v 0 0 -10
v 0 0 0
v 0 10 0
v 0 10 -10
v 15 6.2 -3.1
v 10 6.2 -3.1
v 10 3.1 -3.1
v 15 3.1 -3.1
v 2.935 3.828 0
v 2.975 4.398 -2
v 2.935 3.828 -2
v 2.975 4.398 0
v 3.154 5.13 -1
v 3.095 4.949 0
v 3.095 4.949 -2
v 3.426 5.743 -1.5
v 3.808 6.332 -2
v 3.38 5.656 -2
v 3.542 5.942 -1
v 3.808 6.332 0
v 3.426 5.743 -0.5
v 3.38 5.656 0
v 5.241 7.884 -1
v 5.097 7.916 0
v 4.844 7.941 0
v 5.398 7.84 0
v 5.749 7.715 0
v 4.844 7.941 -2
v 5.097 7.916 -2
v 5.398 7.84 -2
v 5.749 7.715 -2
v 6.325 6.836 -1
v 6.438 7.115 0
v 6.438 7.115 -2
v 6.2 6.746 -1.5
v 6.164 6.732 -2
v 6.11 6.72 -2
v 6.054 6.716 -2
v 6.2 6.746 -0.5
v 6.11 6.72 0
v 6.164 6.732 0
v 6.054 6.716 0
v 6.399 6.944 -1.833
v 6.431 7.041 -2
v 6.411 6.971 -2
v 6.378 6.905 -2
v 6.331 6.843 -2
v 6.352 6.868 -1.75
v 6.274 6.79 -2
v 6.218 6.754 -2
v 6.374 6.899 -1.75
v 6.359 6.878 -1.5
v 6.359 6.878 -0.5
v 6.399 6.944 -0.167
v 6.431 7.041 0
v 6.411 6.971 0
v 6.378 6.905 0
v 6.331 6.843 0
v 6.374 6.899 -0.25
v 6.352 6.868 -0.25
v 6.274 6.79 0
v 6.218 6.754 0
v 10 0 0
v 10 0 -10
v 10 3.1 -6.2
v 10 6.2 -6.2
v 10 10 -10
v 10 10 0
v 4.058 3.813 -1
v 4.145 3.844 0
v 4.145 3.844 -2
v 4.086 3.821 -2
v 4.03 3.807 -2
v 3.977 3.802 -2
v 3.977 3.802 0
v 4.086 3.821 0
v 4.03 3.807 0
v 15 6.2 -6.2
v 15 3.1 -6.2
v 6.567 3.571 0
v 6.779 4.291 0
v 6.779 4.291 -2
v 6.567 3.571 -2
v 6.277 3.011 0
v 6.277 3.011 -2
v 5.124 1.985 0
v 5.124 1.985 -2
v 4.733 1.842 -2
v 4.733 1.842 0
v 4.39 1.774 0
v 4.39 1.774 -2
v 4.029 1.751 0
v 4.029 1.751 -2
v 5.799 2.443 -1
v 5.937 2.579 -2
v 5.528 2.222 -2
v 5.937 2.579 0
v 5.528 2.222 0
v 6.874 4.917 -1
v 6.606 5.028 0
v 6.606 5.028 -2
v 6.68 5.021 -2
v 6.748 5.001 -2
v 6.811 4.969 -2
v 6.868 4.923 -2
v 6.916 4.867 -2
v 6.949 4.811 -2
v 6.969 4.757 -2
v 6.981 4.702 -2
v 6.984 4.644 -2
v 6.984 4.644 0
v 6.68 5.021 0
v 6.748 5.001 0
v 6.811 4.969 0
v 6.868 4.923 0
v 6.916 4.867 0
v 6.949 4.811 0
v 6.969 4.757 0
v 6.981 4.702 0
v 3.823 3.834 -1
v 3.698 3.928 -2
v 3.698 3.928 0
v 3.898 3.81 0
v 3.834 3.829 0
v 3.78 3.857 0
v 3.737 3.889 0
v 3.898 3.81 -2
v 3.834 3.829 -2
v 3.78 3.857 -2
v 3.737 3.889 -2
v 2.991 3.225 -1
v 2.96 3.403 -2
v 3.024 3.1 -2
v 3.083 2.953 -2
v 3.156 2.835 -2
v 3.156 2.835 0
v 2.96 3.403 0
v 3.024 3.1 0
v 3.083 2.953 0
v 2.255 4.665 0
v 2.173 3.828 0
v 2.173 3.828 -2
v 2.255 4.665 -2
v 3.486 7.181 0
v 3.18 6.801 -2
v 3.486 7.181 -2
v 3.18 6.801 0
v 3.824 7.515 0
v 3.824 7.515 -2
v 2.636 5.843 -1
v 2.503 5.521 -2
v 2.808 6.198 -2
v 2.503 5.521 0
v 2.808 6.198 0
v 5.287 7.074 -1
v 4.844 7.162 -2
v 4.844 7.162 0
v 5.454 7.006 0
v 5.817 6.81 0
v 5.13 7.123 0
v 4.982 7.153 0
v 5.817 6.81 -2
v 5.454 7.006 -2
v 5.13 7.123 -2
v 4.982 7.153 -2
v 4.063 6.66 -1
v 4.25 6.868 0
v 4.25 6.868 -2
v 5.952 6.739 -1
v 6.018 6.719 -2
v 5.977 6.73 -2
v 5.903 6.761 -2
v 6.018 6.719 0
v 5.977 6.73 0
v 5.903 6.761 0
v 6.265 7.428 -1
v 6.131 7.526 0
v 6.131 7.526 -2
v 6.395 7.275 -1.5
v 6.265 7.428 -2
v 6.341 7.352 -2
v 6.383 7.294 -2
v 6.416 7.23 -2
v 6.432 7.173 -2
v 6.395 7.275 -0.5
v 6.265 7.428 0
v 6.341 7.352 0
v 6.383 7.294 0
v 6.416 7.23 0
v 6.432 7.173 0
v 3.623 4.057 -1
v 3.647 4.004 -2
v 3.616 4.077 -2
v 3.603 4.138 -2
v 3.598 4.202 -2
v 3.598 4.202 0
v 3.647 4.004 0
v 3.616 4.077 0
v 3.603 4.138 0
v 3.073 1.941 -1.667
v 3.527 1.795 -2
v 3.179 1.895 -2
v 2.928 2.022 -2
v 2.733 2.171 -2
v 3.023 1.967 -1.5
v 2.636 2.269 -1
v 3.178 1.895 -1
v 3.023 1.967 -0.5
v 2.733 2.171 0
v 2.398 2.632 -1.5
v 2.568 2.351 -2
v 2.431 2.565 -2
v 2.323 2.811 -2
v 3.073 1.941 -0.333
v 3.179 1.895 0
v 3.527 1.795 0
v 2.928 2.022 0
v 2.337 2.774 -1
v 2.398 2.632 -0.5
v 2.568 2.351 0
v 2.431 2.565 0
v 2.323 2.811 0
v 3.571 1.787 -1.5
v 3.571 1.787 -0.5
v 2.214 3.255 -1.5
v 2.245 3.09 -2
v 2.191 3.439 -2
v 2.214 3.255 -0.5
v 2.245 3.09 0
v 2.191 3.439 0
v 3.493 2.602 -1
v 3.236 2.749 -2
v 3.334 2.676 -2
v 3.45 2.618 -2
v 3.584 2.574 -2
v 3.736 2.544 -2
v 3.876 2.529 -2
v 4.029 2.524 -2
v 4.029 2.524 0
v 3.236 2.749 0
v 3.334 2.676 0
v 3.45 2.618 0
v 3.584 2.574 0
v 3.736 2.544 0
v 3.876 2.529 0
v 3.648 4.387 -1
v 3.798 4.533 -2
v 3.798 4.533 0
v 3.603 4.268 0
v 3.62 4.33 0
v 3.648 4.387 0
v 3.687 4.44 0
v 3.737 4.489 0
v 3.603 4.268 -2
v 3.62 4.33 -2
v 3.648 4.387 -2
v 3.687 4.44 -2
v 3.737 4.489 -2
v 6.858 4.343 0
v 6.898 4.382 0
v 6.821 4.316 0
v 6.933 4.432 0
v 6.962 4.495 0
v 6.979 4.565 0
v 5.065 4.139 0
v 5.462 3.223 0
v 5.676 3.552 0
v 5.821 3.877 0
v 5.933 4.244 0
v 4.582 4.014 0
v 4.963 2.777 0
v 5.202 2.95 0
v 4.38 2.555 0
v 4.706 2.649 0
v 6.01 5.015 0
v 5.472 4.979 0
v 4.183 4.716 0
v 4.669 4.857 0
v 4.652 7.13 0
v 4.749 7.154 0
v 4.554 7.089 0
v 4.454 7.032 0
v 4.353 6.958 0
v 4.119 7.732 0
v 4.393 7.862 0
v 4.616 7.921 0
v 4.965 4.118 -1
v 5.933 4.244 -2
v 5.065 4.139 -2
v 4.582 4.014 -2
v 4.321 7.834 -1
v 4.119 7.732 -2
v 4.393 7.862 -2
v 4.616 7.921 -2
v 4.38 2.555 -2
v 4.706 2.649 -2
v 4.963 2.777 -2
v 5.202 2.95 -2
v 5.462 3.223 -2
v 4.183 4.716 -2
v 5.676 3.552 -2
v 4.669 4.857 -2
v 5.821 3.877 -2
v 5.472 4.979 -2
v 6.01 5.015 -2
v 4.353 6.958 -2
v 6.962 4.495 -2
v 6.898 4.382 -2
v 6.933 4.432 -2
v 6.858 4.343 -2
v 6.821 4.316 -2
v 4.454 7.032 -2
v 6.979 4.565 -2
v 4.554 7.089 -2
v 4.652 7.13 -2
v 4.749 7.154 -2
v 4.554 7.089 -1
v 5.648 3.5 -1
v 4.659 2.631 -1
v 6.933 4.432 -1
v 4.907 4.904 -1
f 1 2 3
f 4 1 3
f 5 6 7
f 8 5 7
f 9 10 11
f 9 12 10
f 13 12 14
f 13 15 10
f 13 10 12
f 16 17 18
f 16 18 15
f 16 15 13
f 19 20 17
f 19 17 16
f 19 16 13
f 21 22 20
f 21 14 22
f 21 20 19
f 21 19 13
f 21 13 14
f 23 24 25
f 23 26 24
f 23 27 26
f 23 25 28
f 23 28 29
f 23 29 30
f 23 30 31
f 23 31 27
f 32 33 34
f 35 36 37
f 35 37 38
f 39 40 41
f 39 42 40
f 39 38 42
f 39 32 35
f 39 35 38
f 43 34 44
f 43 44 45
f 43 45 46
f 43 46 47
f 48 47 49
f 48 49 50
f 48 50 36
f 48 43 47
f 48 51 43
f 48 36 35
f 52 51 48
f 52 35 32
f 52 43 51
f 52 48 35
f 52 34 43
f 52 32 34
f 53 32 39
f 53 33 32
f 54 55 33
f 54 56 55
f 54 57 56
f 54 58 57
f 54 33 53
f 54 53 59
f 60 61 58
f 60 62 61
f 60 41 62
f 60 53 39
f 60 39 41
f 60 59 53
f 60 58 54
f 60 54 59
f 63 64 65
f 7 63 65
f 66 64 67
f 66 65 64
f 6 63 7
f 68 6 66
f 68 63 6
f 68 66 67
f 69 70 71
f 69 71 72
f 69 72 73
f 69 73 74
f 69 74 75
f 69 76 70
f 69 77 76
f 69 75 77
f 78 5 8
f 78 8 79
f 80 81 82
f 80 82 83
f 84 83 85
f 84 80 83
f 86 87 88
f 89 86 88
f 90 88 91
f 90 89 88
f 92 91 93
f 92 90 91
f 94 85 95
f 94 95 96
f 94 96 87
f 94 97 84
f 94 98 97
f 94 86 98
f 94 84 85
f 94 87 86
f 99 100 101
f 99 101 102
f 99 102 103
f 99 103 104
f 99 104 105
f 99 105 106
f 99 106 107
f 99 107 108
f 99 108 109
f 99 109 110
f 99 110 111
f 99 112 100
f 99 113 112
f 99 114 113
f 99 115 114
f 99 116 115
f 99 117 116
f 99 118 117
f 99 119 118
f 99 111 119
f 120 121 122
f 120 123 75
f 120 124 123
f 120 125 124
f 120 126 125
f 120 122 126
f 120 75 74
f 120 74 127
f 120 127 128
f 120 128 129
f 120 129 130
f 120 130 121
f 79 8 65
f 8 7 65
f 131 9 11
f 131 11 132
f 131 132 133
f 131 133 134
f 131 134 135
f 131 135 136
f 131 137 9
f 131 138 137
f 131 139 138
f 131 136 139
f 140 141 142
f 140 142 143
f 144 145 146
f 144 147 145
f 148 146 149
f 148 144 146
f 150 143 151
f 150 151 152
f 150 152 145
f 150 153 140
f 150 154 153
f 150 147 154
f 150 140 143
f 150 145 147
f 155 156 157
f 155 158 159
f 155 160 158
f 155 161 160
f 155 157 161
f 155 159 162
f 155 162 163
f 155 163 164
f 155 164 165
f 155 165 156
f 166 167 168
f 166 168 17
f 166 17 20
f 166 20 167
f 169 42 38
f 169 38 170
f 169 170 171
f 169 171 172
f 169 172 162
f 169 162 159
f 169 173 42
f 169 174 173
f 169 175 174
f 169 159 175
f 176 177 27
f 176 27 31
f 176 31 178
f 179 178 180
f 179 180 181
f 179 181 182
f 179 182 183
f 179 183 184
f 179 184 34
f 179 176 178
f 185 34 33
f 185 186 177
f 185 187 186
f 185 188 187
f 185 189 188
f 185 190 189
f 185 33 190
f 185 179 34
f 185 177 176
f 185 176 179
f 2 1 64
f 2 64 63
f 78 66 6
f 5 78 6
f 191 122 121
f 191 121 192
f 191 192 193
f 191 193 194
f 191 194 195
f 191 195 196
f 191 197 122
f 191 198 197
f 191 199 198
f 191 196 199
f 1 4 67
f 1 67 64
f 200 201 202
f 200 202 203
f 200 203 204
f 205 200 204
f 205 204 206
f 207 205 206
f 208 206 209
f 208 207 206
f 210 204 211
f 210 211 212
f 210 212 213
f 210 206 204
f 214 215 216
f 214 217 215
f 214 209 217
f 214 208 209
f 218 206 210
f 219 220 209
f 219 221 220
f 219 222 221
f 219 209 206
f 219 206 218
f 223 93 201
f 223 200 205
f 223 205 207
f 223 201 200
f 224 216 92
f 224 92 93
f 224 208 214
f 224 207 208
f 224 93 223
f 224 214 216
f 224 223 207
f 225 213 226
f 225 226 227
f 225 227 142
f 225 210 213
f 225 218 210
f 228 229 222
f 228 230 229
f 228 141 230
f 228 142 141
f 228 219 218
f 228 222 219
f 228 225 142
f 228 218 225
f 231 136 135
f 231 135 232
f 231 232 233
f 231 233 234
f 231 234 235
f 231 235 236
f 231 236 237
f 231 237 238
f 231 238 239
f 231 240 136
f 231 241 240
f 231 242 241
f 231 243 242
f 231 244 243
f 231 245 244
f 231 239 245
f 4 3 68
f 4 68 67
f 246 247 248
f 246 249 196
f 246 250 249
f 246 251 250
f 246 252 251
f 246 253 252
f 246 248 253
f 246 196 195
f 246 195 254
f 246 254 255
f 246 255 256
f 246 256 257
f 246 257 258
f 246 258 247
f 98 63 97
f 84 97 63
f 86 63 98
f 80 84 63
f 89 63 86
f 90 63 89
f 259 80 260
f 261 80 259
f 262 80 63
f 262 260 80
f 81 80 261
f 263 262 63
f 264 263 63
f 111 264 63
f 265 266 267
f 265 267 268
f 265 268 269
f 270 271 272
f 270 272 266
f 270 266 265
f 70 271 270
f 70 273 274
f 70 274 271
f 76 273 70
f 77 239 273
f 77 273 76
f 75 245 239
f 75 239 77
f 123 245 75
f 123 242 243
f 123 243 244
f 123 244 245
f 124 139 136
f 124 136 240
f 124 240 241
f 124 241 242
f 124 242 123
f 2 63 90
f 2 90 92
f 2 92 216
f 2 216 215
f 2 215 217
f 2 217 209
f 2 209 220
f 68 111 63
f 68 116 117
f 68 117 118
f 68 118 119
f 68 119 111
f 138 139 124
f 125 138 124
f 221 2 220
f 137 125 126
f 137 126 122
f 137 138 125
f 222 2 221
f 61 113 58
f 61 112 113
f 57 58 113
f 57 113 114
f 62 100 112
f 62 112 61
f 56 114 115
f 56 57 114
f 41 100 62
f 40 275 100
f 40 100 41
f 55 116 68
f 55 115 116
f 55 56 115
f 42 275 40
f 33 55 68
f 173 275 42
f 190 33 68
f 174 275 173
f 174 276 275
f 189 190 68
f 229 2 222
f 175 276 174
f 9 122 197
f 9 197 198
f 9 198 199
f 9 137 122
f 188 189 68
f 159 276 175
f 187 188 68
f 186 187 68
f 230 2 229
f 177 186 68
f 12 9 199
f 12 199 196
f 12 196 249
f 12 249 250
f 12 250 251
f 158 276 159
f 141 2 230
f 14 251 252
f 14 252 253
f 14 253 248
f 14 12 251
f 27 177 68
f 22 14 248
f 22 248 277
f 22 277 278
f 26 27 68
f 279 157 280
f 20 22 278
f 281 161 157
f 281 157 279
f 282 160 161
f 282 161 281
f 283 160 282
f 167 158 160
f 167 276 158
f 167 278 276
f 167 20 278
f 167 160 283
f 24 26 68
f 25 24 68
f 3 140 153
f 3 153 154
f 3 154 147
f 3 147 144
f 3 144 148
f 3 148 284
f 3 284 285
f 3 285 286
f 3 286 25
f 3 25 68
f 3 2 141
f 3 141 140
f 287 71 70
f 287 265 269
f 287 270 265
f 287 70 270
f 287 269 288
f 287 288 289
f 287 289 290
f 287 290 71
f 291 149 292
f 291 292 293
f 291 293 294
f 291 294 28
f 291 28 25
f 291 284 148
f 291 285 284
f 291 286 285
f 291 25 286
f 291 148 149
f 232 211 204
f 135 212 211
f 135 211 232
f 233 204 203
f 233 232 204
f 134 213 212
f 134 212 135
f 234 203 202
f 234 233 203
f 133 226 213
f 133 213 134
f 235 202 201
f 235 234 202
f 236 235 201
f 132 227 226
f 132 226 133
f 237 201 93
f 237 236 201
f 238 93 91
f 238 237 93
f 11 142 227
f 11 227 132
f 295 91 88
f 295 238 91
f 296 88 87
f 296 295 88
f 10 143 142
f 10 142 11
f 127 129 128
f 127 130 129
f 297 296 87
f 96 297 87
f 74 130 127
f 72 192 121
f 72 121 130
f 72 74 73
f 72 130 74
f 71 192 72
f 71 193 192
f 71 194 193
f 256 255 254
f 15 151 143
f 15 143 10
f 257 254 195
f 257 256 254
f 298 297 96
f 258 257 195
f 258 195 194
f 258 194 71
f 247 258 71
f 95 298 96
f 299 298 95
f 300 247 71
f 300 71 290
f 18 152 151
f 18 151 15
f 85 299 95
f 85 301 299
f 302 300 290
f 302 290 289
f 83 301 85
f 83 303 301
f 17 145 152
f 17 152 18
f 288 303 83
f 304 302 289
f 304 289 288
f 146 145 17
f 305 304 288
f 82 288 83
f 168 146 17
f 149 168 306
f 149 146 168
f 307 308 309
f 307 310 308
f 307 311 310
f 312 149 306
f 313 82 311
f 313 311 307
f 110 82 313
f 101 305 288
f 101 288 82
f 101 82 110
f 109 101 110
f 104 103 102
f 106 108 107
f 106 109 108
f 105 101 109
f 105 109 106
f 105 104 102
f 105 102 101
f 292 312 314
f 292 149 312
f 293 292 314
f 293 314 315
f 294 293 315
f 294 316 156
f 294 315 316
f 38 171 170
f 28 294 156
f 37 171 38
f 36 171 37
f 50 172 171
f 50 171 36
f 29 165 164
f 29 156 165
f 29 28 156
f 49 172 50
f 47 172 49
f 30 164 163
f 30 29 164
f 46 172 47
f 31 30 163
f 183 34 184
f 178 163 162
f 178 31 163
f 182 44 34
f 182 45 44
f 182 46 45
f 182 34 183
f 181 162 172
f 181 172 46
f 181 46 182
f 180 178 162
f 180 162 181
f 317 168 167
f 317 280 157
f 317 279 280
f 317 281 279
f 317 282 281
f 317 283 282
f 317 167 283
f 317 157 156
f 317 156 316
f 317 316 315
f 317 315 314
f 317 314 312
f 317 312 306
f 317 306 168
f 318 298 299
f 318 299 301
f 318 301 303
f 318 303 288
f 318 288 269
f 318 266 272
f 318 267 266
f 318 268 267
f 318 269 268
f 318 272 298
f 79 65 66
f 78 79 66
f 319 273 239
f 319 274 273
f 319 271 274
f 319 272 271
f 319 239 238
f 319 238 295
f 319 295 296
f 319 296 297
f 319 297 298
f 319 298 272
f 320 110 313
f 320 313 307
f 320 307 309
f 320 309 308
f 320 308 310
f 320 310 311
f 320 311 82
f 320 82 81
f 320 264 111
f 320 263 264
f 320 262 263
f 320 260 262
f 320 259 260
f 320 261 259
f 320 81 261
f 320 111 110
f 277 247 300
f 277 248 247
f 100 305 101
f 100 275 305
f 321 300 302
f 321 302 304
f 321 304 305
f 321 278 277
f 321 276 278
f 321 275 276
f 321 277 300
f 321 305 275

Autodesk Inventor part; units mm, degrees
ref_plane "YZ Plane" through (0, 0, 0) normal (1, 0, 0) x (0, 1, 0)
ref_plane "XZ Plane" through (0, 0, 0) normal (0, 1, 0) x (-1, 0, 0)
ref_plane "XY Plane" through (0, 0, 0) normal (0, 0, 1) x (1, 0, 0)
sketch "Sketch1" plane through (0, 0, 0) normal (1, 0, 0) x (0, 1, 0)
  line L0 (0, 0) -> (10, 0)
  line L1 (10, 0) -> (10, -10)
  line L2 (10, -10) -> (0, -10)
  line L3 (0, -10) -> (0, 0)
  dimension "d0" = 10
  dimension "d1" = 10
extrude "Extrusion1" add sketch "Sketch1" along normal blind 10
sketch "Sketch4" plane through (0, 0, 0) normal (0, 0, 1) x (1, 0, 0)
  line L0 (1.8731, 7.9408) -> (4.4271, 7.9408) construction
  line L1 (4.4271, 7.9408) -> (4.4271, 4.8928) construction
  line L2 (4.4271, 4.8928) -> (1.8731, 4.8928) construction
  line L3 (1.8731, 4.8928) -> (1.8731, 7.9408) construction
  spline S0 degree 2 poles (6.7794, 4.2913) (6.548, 3.1344) (5.0493, 1.7514) (4.0292, 1.7514) knots 0 0 0 1 2 2 2
  spline S1 degree 2 poles (4.0292, 1.7514) (3.0984, 1.7514) (2.1729, 2.7873) (2.1729, 3.8285) knots 0 0 0 1 2 2 2
  spline S2 degree 2 poles (2.1729, 3.8285) (2.1729, 4.8066) (3.0984, 6.8785) (3.8241, 7.5148) knots 0 0 0 1 2 2 2
  spline S3 degree 2 poles (3.8241, 7.5148) (4.3079, 7.9408) (4.8442, 7.9408) knots 0 0 0 1 1 1
  spline S4 degree 2 poles (4.8442, 7.9408) (5.1861, 7.9408) (5.7487, 7.7146) knots 0 0 0 1 1 1
  spline S5 degree 2 poles (5.7487, 7.7146) (6.4376, 7.4412) (6.4376, 7.1152) knots 0 0 0 1 1 1
  spline S6 degree 2 poles (6.4376, 7.1152) (6.4376, 6.9574) (6.2115, 6.7155) (6.0537, 6.7155) knots 0 0 0 1 2 2 2
  spline S7 degree 2 poles (6.0537, 6.7155) (5.9696, 6.7155) (5.8171, 6.8102) knots 0 0 0 1 1 1
  spline S8 degree 2 poles (5.8171, 6.8102) (5.2439, 7.1625) (4.8442, 7.1625) knots 0 0 0 1 1 1
  spline S9 degree 2 poles (4.8442, 7.1625) (4.5603, 7.1625) (4.25, 6.868) knots 0 0 0 1 1 1
  spline S10 degree 2 poles (4.25, 6.868) (4.0975, 6.7208) (3.8083, 6.3316) knots 0 0 0 1 1 1
  spline S11 degree 2 poles (3.8083, 6.3316) (2.9354, 5.18) (2.9354, 3.8285) knots 0 0 0 1 1 1
  spline S12 degree 2 poles (2.9354, 3.8285) (2.9354, 3.1186) (3.1562, 2.8346) knots 0 0 0 1 1 1
  spline S13 degree 2 poles (3.1562, 2.8346) (3.3929, 2.5244) (4.0292, 2.5244) knots 0 0 0 1 1 1
  spline S14 degree 2 poles (4.0292, 2.5244) (4.7023, 2.5244) (5.2018, 2.9503) knots 0 0 0 1 1 1
  spline S15 degree 2 poles (5.2018, 2.9503) (5.7277, 3.4026) (5.9328, 4.2439) knots 0 0 0 1 1 1
  spline S16 degree 2 poles (5.9328, 4.2439) (4.8916, 4.1914) (4.1448, 3.8443) knots 0 0 0 1 1 1
  spline S17 degree 2 poles (4.1448, 3.8443) (4.0554, 3.8022) (3.9766, 3.8022) knots 0 0 0 1 1 1
  spline S18 degree 2 poles (3.9766, 3.8022) (3.8083, 3.8022) (3.6979, 3.9284) knots 0 0 0 1 1 1
  spline S19 degree 2 poles (3.6979, 3.9284) (3.5979, 4.0494) (3.5979, 4.2019) knots 0 0 0 1 1 1
  spline S20 degree 2 poles (3.5979, 4.2019) (3.5979, 4.407) (3.7978, 4.5332) knots 0 0 0 1 1 1
  spline S21 degree 2 poles (3.7978, 4.5332) (4.6129, 5.0275) (6.6059, 5.0275) knots 0 0 0 1 1 1
  spline S22 degree 2 poles (6.6059, 5.0275) (6.7636, 5.0275) (6.9845, 4.8066) (6.9845, 4.6436) knots 0 0 0 1 2 2 2
  spline S23 degree 2 poles (6.9845, 4.6436) (6.9845, 4.3964) (6.7794, 4.2913) knots 0 0 0 1 1 1
  point P0 (0, 0)
extrude "Extrusion4" cut sketch "Sketch4" against normal blind 2
sketch "Sketch5" plane through (10, 0, 0) normal (1, 0, 0) x (0, 0, -1)
  line L0 (3.1, 3.1) -> (6.2, 3.1)
  line L1 (6.2, 3.1) -> (6.2, 6.2)
  line L2 (6.2, 6.2) -> (3.1, 6.2)
  line L3 (3.1, 6.2) -> (3.1, 3.1)
  point P0 (0, 0)
  dimension "d11" = 3.1
  dimension "d12" = 3.1
extrude "Extrusion5" add sketch "Sketch5" along normal blind 5
properties part number "Guanine"
